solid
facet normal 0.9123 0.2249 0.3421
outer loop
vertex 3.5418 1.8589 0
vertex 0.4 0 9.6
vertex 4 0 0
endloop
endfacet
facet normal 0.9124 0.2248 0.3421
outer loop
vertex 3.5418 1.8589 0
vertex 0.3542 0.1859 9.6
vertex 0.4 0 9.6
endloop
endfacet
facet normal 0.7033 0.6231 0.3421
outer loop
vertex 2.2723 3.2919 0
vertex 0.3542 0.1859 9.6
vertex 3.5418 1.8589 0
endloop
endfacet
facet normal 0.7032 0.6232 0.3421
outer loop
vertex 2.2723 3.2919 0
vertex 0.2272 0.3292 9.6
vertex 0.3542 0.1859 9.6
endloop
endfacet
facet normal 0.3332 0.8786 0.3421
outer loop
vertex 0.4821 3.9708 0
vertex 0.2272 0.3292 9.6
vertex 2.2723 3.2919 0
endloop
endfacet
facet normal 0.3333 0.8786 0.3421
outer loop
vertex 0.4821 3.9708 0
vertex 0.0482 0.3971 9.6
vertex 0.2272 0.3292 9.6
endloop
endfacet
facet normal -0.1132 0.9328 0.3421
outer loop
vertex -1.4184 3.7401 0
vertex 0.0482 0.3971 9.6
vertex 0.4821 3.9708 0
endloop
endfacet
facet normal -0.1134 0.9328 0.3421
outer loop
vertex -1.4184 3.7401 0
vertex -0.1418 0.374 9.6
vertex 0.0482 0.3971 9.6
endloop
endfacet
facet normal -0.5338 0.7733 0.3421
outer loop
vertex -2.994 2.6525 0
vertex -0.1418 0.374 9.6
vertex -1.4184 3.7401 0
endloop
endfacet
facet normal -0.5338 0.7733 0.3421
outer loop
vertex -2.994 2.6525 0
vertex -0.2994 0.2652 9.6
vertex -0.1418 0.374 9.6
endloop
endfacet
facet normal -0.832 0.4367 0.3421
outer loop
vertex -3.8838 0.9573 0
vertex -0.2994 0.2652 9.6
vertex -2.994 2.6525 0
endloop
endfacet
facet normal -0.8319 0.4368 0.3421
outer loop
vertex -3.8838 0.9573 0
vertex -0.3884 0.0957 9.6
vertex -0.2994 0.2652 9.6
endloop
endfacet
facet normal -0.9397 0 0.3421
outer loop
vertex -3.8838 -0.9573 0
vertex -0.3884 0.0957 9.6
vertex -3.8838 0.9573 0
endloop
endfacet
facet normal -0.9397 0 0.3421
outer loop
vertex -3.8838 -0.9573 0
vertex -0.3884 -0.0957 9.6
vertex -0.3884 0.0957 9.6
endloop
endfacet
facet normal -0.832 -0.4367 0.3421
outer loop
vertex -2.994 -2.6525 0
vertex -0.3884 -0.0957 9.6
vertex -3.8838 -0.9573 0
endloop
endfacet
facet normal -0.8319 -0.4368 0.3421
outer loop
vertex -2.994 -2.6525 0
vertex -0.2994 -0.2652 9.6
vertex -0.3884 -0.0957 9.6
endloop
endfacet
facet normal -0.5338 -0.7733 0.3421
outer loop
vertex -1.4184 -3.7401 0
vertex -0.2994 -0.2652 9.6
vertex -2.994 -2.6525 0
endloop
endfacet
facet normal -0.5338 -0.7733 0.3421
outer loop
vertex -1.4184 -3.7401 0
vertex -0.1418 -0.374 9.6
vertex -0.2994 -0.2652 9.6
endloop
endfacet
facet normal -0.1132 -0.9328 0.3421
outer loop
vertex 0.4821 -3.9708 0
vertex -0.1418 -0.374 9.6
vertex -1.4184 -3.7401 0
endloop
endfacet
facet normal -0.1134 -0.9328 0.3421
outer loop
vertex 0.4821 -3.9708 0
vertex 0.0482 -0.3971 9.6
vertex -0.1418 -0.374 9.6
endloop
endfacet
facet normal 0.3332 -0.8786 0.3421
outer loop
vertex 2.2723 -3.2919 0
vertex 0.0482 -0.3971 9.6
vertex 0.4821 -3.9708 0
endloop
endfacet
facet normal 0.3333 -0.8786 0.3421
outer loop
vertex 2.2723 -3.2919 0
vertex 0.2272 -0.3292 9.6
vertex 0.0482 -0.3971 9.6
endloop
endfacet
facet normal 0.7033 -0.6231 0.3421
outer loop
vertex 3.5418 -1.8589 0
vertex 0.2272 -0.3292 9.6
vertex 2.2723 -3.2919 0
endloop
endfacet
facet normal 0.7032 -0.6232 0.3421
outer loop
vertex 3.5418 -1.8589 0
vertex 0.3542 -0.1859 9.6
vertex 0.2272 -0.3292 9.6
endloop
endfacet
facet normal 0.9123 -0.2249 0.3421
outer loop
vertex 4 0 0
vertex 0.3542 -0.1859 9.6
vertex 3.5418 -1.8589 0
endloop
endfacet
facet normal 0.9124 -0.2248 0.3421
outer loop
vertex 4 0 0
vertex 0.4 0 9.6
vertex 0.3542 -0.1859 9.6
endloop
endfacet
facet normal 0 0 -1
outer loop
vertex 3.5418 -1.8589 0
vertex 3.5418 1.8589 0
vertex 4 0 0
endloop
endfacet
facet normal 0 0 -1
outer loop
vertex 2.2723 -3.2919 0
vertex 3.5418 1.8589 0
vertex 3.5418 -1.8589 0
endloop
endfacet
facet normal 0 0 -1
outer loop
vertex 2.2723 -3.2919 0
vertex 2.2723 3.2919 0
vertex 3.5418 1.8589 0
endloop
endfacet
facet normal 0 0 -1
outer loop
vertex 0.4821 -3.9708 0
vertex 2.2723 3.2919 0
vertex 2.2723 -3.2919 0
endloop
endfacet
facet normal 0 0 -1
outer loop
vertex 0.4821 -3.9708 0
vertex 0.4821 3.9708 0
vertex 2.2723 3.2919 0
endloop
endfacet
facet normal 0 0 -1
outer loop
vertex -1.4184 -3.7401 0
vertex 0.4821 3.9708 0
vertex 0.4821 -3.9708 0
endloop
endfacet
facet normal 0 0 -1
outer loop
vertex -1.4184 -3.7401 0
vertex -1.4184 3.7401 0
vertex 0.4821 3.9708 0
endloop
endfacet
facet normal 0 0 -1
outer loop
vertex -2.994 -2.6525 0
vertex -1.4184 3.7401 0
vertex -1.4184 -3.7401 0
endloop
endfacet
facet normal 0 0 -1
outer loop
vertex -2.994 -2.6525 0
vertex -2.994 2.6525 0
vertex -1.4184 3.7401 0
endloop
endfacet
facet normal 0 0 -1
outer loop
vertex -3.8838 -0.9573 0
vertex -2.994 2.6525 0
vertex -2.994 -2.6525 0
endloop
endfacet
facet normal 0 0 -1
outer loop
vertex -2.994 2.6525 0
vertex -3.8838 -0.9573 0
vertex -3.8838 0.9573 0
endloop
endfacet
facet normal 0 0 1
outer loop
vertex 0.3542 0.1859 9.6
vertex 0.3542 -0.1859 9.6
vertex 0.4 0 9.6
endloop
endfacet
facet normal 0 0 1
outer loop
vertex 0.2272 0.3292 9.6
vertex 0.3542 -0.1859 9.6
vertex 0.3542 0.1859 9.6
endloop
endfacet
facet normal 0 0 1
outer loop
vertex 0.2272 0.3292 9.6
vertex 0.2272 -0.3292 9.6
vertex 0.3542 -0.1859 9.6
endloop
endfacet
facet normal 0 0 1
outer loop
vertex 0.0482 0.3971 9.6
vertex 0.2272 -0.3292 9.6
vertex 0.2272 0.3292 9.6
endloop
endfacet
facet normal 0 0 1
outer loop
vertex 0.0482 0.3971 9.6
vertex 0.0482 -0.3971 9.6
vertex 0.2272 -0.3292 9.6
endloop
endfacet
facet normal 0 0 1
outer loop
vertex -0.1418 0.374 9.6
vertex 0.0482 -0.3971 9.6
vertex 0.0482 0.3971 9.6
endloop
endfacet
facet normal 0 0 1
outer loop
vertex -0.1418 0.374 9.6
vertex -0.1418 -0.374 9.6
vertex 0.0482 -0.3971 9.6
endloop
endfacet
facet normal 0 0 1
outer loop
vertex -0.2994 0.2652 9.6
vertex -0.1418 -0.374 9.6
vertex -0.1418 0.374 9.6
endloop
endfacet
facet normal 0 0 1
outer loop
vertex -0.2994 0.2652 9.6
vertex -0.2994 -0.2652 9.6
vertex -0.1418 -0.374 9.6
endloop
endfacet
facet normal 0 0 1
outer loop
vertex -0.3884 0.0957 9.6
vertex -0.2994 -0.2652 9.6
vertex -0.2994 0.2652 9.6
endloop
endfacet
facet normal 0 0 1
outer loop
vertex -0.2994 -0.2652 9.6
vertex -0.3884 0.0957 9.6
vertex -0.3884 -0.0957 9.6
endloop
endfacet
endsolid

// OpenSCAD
// studs/cone_spike.scad — round-base cone spike.
// MIT licensed.

module stud_cone_spike(size = 6, tip_radius = 0.4, height = undef) {
    h = is_undef(height) ? size * 1.2 : height;
    cylinder(h = h, r1 = size / 2, r2 = max(tip_radius, 0.001));
}

stud_cone_spike(size = 8, tip_radius = 0.4);
